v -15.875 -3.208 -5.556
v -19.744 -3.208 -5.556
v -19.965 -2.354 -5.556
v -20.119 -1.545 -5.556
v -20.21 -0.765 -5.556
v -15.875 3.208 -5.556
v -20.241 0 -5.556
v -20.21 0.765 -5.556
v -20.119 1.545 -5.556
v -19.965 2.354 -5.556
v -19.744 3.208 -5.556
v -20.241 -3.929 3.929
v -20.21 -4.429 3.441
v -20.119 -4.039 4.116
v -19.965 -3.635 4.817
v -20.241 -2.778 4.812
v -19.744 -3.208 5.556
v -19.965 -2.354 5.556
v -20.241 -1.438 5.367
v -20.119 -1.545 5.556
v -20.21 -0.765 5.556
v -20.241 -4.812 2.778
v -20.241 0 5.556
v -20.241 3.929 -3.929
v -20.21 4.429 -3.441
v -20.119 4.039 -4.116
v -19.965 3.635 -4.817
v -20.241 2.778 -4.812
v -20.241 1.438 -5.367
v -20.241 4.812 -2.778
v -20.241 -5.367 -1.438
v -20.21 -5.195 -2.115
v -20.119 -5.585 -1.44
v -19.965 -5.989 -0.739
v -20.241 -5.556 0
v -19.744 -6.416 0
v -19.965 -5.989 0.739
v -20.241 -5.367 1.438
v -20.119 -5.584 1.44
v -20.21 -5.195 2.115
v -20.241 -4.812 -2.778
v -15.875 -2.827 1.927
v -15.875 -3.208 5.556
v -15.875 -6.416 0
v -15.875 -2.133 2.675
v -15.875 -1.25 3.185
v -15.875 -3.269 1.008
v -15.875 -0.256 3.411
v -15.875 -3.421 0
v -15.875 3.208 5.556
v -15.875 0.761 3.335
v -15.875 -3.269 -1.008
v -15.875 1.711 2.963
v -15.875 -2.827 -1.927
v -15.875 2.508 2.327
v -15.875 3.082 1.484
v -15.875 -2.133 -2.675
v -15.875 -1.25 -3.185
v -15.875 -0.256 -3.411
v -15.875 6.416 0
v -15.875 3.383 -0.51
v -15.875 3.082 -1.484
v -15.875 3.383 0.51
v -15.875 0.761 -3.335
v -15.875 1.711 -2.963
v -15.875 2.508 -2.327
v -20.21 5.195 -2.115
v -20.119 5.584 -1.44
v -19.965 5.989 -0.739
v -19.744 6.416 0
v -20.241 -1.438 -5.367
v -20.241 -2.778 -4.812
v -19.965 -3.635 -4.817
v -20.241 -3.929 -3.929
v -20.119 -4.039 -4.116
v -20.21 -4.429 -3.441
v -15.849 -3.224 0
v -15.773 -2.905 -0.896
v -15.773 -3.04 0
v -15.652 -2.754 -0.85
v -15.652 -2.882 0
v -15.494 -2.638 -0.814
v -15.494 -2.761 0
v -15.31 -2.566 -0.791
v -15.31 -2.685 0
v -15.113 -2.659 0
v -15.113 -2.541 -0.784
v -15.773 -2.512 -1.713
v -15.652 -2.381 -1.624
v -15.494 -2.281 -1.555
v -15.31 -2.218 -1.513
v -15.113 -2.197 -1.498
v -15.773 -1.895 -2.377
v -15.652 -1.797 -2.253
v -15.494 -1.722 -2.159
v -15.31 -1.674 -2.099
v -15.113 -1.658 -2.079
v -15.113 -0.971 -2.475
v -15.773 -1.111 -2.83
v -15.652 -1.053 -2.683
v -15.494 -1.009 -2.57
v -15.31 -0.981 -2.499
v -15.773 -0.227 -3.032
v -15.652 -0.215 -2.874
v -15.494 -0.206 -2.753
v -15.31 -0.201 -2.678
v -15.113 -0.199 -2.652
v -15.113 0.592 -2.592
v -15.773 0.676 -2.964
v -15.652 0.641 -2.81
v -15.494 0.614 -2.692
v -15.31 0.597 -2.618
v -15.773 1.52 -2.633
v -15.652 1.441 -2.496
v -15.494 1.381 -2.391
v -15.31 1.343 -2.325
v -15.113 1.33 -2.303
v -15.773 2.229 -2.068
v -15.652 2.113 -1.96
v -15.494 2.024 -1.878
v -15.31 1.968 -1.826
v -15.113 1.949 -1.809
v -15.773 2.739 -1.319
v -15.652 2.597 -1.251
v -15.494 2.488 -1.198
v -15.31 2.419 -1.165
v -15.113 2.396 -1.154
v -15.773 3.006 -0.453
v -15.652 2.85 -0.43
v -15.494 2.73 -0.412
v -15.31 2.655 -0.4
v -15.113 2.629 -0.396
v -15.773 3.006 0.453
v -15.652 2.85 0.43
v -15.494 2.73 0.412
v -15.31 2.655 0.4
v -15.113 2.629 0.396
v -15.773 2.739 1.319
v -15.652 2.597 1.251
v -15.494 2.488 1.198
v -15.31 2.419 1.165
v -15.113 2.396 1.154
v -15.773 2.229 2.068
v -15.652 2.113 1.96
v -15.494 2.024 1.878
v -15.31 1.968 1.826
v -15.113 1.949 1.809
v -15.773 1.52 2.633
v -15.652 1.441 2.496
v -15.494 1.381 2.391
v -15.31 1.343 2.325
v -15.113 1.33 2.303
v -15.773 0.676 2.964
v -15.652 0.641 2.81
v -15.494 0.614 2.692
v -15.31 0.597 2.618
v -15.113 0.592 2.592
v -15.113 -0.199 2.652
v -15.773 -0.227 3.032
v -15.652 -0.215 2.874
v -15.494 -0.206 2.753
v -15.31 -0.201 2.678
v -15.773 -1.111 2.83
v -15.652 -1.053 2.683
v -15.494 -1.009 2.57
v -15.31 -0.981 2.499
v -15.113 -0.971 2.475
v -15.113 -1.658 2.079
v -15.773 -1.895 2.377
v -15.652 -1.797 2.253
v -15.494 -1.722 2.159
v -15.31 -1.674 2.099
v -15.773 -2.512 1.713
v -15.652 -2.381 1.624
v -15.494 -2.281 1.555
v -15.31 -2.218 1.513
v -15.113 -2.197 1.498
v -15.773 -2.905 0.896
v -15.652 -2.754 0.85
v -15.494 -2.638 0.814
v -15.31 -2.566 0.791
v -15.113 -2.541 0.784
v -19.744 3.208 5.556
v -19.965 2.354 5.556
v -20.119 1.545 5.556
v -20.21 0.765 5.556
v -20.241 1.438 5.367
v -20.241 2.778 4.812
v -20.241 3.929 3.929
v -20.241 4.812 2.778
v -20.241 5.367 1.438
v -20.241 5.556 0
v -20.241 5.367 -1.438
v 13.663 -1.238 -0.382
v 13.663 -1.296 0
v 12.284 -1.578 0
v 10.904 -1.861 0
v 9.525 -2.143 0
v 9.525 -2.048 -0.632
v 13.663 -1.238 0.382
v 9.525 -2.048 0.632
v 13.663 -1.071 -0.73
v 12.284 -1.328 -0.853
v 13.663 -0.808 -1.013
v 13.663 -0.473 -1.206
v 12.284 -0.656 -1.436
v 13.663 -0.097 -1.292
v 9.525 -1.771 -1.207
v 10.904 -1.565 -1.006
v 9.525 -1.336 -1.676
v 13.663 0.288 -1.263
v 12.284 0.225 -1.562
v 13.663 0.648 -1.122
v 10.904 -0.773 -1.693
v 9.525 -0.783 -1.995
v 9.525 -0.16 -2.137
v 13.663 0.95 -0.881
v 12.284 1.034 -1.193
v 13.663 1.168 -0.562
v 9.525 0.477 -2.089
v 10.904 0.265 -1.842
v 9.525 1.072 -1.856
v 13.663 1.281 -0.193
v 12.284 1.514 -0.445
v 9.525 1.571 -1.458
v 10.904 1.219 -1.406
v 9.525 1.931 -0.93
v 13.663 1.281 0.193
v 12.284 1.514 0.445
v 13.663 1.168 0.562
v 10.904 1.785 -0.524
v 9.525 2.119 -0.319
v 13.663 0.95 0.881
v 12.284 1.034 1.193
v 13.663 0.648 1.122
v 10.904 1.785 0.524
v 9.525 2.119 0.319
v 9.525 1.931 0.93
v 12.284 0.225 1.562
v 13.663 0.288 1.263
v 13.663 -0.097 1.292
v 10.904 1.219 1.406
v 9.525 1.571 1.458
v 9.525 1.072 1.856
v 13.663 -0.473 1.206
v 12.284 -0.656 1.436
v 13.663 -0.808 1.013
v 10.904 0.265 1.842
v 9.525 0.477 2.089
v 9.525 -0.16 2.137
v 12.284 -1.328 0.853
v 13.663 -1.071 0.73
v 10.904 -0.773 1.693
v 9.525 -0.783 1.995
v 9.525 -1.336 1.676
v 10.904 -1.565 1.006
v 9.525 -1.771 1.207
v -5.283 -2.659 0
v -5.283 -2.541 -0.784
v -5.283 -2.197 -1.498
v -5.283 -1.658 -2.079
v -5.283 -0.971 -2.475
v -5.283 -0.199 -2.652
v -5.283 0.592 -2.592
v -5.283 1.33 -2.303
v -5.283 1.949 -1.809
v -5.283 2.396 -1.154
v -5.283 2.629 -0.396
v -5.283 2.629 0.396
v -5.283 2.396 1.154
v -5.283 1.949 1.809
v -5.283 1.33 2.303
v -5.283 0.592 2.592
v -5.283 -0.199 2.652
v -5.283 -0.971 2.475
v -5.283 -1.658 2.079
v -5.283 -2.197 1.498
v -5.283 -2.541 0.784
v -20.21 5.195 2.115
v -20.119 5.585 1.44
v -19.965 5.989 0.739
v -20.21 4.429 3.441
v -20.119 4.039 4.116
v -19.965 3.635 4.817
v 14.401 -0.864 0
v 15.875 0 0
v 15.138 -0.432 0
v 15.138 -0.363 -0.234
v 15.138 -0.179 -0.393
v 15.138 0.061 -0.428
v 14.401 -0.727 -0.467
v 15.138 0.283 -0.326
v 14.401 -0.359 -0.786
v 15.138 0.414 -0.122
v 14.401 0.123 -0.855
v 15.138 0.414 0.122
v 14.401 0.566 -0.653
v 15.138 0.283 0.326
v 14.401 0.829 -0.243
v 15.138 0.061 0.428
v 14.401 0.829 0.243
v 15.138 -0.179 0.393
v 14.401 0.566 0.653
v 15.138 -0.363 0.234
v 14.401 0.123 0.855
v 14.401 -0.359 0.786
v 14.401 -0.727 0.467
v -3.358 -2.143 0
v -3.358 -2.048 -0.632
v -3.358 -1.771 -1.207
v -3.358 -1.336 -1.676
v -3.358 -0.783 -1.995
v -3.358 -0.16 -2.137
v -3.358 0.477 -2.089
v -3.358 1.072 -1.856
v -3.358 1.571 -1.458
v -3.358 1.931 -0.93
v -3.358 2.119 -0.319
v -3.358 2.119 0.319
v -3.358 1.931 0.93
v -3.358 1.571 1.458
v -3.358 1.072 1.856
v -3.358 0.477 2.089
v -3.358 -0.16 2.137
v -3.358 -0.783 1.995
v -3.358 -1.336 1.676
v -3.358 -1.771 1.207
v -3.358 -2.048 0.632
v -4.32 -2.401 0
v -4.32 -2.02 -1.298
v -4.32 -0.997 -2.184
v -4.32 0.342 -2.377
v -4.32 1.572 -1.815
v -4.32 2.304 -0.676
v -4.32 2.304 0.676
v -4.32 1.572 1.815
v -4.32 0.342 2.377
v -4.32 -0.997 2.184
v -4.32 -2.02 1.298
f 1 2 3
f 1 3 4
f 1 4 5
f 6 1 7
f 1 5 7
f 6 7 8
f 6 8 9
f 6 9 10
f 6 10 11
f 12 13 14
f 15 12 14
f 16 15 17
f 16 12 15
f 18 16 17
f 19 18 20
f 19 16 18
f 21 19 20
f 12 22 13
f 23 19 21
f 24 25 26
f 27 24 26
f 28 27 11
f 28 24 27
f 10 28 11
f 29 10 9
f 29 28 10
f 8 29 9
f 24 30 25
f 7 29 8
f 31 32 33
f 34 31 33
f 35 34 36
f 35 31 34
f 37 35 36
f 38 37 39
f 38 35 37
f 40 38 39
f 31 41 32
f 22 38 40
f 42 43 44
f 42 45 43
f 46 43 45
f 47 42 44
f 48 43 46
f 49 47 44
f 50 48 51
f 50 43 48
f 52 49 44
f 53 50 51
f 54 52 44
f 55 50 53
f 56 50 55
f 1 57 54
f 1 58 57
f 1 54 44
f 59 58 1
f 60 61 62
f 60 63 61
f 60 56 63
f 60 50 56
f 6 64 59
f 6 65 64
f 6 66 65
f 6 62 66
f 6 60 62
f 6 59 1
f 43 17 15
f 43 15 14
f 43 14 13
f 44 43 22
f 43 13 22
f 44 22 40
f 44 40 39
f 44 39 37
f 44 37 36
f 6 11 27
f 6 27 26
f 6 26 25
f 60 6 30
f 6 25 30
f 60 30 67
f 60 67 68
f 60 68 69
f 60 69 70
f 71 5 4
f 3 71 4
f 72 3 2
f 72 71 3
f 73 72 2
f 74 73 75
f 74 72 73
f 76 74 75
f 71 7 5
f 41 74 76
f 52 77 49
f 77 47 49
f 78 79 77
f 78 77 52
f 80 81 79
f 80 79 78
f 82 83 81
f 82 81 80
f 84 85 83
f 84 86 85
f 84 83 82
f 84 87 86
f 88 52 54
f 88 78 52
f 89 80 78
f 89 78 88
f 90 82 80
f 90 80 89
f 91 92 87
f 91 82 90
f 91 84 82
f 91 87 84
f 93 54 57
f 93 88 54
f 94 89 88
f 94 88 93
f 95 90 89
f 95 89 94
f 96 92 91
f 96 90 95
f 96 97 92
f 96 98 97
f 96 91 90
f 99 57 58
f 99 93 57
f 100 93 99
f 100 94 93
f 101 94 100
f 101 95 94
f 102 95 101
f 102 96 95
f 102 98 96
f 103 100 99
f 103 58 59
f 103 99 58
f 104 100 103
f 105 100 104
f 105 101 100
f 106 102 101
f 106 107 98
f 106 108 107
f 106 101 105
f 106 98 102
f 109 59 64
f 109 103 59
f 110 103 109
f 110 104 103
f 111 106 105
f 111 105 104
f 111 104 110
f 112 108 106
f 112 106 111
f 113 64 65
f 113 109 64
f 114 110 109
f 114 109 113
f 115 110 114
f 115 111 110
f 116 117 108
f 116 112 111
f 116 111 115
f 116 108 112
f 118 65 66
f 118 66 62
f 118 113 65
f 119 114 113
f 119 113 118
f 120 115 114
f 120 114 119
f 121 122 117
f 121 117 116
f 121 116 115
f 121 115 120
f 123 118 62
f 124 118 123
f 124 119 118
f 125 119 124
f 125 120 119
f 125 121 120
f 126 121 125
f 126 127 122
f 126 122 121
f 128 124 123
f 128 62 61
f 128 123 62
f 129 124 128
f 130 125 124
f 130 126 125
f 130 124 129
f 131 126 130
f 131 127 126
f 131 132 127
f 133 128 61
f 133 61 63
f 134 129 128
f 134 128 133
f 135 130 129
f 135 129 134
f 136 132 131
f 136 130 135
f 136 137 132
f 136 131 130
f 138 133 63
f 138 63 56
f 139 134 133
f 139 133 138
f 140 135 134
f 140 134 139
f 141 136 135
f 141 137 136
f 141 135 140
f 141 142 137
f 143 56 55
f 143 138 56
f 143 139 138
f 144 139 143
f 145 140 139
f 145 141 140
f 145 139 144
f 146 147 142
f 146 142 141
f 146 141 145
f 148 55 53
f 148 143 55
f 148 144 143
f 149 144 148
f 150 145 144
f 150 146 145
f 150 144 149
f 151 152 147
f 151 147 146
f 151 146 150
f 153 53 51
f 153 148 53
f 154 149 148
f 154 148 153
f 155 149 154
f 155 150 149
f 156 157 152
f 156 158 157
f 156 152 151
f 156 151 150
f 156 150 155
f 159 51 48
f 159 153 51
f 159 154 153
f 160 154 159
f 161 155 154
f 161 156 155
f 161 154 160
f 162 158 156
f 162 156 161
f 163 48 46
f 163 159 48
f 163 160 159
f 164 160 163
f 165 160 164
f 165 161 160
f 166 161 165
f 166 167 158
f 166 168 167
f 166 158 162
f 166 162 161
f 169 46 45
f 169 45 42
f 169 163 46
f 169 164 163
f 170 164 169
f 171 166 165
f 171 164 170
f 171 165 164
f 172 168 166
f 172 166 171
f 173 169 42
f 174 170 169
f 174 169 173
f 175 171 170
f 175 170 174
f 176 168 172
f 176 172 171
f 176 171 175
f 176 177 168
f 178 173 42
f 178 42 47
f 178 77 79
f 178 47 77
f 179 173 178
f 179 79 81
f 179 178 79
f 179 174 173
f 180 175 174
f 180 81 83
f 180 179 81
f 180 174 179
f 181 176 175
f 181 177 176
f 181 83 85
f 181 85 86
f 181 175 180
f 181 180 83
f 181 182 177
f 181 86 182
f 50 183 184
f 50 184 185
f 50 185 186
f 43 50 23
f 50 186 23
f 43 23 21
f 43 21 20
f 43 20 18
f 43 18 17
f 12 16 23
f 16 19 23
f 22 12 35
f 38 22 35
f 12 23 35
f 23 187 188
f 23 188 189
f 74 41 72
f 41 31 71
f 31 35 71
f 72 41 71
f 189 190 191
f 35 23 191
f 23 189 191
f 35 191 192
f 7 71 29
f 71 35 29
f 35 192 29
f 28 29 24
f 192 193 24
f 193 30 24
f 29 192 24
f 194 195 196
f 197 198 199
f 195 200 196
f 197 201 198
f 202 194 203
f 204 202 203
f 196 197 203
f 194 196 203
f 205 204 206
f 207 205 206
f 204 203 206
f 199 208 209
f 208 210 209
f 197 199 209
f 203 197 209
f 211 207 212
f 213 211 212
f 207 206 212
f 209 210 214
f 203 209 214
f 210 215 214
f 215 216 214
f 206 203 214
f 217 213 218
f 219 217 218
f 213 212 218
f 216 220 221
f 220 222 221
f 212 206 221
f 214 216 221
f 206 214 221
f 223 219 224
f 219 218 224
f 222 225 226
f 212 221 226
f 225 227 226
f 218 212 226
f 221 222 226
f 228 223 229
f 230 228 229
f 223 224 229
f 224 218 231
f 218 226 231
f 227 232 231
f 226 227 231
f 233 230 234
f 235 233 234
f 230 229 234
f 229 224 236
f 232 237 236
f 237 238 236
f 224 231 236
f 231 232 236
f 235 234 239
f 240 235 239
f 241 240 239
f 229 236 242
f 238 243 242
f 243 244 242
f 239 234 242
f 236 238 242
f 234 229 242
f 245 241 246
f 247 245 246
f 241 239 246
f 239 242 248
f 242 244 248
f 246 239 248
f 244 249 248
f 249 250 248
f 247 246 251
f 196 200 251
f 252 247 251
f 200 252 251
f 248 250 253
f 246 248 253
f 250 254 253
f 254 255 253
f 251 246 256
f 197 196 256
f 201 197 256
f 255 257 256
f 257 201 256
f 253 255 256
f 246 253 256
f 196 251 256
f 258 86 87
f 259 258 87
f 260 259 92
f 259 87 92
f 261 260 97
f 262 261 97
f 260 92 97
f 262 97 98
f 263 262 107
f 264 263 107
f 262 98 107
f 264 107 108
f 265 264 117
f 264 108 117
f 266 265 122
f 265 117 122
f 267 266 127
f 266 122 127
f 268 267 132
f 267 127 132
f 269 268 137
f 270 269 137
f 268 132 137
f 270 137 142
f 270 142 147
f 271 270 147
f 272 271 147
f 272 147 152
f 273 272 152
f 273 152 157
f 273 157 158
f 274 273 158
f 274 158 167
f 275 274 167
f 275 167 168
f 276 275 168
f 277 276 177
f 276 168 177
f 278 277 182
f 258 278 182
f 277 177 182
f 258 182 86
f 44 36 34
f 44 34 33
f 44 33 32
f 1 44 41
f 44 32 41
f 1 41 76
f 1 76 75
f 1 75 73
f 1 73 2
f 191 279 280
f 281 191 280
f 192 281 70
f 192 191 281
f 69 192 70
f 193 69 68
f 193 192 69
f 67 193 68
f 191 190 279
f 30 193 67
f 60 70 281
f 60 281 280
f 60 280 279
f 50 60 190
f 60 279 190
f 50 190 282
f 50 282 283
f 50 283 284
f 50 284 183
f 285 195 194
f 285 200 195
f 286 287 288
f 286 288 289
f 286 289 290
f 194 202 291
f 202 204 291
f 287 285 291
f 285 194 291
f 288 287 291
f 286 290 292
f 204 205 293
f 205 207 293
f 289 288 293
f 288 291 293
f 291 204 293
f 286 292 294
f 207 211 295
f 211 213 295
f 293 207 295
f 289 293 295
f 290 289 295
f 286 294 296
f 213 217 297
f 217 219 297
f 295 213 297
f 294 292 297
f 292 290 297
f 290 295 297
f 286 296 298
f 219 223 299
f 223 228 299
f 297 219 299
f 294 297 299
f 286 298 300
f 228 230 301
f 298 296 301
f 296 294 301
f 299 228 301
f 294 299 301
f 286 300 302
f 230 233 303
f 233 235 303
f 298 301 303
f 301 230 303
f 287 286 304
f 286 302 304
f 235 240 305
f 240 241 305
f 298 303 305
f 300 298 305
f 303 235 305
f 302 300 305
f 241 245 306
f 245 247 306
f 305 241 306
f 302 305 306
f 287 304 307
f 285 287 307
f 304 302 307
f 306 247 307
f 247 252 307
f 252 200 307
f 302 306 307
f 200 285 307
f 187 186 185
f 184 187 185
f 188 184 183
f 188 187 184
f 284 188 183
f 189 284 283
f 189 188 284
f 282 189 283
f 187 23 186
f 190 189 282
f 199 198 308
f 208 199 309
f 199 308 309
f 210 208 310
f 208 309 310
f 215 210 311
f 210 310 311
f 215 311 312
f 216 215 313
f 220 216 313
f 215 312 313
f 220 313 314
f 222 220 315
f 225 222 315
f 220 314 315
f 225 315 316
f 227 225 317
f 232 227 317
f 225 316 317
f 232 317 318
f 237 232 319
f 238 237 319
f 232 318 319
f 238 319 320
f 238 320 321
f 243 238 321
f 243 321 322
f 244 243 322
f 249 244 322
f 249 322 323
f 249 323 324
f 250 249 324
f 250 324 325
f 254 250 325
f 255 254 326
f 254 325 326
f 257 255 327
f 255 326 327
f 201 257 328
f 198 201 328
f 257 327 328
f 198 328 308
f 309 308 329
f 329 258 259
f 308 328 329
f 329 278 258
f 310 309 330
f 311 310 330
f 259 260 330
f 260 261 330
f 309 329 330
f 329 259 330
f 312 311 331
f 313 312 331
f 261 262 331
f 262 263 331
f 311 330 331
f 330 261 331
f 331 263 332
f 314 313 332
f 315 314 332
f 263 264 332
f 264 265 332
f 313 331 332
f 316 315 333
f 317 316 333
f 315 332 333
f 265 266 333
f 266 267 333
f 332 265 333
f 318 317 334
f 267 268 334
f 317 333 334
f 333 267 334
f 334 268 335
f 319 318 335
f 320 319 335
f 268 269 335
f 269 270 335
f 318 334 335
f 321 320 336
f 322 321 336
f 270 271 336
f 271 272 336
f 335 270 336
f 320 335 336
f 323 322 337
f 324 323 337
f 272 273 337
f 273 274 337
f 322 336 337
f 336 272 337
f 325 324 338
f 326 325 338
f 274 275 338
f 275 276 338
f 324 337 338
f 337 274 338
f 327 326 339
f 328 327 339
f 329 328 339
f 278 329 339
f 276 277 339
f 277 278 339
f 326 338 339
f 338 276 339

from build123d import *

# Parameters (mm, degrees)
BOSS_EXTRUDE2_START = -20.240625
BOSS_EXTRUDE2_DEPTH = 4.365625
SKETCH16_OUTSIDE_W  = 153.074
SKETCH16_OUTSIDE_H  = 154.794
SKETCH16_OUTSIDE_R  = 5.55625
CUT_EXTRUDE7_DEPTH  = 38.099499124
CUT_EXTRUDE7_DRAFT  = -60
FILLET1_R           = 0.762


with BuildPart() as part:
    # Sketch6 → Revolve1 (revolve)
    with BuildSketch(Plane.XY, mode=Mode.PRIVATE) as revolve1_sk:
        Polygon((9.525, 2.143125), (-3.357695036, 2.143125), (-5.2832, 2.6590625), (-15.875, 2.6590625), (-15.875, 5.55625), (-20.240625, 5.55625), (-20.240625, 0), (15.875, 0), (13.663446892, 1.295930736), align=None)
    revolve(revolve1_sk.sketch.rotate(Axis((-20.240625, 0, 0), (1, 0, 0)), 180), axis=Axis((-20.240625, 0, 0), (1, 0, 0)))

    # Sketch15 → Boss-Extrude2 (add)
    with BuildSketch(Plane(origin=(0, 0, 0), x_dir=(0, 0, -1), z_dir=(1, 0, 0)).offset(BOSS_EXTRUDE2_START)):
        Polygon((0, 6.415804866), (-5.55625, 3.207902433), (-5.55625, -3.207902433), (0, -6.415804866), (5.55625, -3.207902433), (5.55625, 3.207902433), align=None)
    extrude(amount=BOSS_EXTRUDE2_DEPTH)


with BuildPart() as cut_extrude7_tool:
    # Sketch16 outside → Cut-Extrude7 (with draft: the straight prism first)
    with BuildSketch(Plane.ZY.offset(20.240625)):
        Rectangle(SKETCH16_OUTSIDE_W, SKETCH16_OUTSIDE_H)
        Circle(SKETCH16_OUTSIDE_R, mode=Mode.SUBTRACT)
    extrude(amount=-CUT_EXTRUDE7_DEPTH)
    # Cut-Extrude7: the draft: its side faces are tilted about the plane it starts from
    cut_extrude7_sides = [cut_extrude7_tool.faces().sort_by_distance(p)[0] for p in [
        (-1.190875438, -77.397, 0),
        (-1.190875438, 0, 76.537),
        (-1.190875438, 77.397, 0),
        (-1.190875438, 0, -76.537),
        (-1.190875438, 0, -5.55625),
    ]]
    draft(cut_extrude7_sides, Plane.ZY.offset(20.240625), CUT_EXTRUDE7_DRAFT)


with BuildPart() as part_1:
    add(part.part)

    # Cut-Extrude7: cut by cut_extrude7_tool
    add(cut_extrude7_tool.part, mode=Mode.SUBTRACT)

    # Fillet1
    fillet1_edges = [part_1.edges().sort_by_distance(p)[0] for p in [
        (-15.875, 2.6590625, 0),
    ]]
    fillet(fillet1_edges, radius=FILLET1_R)


solid = part_1.part
